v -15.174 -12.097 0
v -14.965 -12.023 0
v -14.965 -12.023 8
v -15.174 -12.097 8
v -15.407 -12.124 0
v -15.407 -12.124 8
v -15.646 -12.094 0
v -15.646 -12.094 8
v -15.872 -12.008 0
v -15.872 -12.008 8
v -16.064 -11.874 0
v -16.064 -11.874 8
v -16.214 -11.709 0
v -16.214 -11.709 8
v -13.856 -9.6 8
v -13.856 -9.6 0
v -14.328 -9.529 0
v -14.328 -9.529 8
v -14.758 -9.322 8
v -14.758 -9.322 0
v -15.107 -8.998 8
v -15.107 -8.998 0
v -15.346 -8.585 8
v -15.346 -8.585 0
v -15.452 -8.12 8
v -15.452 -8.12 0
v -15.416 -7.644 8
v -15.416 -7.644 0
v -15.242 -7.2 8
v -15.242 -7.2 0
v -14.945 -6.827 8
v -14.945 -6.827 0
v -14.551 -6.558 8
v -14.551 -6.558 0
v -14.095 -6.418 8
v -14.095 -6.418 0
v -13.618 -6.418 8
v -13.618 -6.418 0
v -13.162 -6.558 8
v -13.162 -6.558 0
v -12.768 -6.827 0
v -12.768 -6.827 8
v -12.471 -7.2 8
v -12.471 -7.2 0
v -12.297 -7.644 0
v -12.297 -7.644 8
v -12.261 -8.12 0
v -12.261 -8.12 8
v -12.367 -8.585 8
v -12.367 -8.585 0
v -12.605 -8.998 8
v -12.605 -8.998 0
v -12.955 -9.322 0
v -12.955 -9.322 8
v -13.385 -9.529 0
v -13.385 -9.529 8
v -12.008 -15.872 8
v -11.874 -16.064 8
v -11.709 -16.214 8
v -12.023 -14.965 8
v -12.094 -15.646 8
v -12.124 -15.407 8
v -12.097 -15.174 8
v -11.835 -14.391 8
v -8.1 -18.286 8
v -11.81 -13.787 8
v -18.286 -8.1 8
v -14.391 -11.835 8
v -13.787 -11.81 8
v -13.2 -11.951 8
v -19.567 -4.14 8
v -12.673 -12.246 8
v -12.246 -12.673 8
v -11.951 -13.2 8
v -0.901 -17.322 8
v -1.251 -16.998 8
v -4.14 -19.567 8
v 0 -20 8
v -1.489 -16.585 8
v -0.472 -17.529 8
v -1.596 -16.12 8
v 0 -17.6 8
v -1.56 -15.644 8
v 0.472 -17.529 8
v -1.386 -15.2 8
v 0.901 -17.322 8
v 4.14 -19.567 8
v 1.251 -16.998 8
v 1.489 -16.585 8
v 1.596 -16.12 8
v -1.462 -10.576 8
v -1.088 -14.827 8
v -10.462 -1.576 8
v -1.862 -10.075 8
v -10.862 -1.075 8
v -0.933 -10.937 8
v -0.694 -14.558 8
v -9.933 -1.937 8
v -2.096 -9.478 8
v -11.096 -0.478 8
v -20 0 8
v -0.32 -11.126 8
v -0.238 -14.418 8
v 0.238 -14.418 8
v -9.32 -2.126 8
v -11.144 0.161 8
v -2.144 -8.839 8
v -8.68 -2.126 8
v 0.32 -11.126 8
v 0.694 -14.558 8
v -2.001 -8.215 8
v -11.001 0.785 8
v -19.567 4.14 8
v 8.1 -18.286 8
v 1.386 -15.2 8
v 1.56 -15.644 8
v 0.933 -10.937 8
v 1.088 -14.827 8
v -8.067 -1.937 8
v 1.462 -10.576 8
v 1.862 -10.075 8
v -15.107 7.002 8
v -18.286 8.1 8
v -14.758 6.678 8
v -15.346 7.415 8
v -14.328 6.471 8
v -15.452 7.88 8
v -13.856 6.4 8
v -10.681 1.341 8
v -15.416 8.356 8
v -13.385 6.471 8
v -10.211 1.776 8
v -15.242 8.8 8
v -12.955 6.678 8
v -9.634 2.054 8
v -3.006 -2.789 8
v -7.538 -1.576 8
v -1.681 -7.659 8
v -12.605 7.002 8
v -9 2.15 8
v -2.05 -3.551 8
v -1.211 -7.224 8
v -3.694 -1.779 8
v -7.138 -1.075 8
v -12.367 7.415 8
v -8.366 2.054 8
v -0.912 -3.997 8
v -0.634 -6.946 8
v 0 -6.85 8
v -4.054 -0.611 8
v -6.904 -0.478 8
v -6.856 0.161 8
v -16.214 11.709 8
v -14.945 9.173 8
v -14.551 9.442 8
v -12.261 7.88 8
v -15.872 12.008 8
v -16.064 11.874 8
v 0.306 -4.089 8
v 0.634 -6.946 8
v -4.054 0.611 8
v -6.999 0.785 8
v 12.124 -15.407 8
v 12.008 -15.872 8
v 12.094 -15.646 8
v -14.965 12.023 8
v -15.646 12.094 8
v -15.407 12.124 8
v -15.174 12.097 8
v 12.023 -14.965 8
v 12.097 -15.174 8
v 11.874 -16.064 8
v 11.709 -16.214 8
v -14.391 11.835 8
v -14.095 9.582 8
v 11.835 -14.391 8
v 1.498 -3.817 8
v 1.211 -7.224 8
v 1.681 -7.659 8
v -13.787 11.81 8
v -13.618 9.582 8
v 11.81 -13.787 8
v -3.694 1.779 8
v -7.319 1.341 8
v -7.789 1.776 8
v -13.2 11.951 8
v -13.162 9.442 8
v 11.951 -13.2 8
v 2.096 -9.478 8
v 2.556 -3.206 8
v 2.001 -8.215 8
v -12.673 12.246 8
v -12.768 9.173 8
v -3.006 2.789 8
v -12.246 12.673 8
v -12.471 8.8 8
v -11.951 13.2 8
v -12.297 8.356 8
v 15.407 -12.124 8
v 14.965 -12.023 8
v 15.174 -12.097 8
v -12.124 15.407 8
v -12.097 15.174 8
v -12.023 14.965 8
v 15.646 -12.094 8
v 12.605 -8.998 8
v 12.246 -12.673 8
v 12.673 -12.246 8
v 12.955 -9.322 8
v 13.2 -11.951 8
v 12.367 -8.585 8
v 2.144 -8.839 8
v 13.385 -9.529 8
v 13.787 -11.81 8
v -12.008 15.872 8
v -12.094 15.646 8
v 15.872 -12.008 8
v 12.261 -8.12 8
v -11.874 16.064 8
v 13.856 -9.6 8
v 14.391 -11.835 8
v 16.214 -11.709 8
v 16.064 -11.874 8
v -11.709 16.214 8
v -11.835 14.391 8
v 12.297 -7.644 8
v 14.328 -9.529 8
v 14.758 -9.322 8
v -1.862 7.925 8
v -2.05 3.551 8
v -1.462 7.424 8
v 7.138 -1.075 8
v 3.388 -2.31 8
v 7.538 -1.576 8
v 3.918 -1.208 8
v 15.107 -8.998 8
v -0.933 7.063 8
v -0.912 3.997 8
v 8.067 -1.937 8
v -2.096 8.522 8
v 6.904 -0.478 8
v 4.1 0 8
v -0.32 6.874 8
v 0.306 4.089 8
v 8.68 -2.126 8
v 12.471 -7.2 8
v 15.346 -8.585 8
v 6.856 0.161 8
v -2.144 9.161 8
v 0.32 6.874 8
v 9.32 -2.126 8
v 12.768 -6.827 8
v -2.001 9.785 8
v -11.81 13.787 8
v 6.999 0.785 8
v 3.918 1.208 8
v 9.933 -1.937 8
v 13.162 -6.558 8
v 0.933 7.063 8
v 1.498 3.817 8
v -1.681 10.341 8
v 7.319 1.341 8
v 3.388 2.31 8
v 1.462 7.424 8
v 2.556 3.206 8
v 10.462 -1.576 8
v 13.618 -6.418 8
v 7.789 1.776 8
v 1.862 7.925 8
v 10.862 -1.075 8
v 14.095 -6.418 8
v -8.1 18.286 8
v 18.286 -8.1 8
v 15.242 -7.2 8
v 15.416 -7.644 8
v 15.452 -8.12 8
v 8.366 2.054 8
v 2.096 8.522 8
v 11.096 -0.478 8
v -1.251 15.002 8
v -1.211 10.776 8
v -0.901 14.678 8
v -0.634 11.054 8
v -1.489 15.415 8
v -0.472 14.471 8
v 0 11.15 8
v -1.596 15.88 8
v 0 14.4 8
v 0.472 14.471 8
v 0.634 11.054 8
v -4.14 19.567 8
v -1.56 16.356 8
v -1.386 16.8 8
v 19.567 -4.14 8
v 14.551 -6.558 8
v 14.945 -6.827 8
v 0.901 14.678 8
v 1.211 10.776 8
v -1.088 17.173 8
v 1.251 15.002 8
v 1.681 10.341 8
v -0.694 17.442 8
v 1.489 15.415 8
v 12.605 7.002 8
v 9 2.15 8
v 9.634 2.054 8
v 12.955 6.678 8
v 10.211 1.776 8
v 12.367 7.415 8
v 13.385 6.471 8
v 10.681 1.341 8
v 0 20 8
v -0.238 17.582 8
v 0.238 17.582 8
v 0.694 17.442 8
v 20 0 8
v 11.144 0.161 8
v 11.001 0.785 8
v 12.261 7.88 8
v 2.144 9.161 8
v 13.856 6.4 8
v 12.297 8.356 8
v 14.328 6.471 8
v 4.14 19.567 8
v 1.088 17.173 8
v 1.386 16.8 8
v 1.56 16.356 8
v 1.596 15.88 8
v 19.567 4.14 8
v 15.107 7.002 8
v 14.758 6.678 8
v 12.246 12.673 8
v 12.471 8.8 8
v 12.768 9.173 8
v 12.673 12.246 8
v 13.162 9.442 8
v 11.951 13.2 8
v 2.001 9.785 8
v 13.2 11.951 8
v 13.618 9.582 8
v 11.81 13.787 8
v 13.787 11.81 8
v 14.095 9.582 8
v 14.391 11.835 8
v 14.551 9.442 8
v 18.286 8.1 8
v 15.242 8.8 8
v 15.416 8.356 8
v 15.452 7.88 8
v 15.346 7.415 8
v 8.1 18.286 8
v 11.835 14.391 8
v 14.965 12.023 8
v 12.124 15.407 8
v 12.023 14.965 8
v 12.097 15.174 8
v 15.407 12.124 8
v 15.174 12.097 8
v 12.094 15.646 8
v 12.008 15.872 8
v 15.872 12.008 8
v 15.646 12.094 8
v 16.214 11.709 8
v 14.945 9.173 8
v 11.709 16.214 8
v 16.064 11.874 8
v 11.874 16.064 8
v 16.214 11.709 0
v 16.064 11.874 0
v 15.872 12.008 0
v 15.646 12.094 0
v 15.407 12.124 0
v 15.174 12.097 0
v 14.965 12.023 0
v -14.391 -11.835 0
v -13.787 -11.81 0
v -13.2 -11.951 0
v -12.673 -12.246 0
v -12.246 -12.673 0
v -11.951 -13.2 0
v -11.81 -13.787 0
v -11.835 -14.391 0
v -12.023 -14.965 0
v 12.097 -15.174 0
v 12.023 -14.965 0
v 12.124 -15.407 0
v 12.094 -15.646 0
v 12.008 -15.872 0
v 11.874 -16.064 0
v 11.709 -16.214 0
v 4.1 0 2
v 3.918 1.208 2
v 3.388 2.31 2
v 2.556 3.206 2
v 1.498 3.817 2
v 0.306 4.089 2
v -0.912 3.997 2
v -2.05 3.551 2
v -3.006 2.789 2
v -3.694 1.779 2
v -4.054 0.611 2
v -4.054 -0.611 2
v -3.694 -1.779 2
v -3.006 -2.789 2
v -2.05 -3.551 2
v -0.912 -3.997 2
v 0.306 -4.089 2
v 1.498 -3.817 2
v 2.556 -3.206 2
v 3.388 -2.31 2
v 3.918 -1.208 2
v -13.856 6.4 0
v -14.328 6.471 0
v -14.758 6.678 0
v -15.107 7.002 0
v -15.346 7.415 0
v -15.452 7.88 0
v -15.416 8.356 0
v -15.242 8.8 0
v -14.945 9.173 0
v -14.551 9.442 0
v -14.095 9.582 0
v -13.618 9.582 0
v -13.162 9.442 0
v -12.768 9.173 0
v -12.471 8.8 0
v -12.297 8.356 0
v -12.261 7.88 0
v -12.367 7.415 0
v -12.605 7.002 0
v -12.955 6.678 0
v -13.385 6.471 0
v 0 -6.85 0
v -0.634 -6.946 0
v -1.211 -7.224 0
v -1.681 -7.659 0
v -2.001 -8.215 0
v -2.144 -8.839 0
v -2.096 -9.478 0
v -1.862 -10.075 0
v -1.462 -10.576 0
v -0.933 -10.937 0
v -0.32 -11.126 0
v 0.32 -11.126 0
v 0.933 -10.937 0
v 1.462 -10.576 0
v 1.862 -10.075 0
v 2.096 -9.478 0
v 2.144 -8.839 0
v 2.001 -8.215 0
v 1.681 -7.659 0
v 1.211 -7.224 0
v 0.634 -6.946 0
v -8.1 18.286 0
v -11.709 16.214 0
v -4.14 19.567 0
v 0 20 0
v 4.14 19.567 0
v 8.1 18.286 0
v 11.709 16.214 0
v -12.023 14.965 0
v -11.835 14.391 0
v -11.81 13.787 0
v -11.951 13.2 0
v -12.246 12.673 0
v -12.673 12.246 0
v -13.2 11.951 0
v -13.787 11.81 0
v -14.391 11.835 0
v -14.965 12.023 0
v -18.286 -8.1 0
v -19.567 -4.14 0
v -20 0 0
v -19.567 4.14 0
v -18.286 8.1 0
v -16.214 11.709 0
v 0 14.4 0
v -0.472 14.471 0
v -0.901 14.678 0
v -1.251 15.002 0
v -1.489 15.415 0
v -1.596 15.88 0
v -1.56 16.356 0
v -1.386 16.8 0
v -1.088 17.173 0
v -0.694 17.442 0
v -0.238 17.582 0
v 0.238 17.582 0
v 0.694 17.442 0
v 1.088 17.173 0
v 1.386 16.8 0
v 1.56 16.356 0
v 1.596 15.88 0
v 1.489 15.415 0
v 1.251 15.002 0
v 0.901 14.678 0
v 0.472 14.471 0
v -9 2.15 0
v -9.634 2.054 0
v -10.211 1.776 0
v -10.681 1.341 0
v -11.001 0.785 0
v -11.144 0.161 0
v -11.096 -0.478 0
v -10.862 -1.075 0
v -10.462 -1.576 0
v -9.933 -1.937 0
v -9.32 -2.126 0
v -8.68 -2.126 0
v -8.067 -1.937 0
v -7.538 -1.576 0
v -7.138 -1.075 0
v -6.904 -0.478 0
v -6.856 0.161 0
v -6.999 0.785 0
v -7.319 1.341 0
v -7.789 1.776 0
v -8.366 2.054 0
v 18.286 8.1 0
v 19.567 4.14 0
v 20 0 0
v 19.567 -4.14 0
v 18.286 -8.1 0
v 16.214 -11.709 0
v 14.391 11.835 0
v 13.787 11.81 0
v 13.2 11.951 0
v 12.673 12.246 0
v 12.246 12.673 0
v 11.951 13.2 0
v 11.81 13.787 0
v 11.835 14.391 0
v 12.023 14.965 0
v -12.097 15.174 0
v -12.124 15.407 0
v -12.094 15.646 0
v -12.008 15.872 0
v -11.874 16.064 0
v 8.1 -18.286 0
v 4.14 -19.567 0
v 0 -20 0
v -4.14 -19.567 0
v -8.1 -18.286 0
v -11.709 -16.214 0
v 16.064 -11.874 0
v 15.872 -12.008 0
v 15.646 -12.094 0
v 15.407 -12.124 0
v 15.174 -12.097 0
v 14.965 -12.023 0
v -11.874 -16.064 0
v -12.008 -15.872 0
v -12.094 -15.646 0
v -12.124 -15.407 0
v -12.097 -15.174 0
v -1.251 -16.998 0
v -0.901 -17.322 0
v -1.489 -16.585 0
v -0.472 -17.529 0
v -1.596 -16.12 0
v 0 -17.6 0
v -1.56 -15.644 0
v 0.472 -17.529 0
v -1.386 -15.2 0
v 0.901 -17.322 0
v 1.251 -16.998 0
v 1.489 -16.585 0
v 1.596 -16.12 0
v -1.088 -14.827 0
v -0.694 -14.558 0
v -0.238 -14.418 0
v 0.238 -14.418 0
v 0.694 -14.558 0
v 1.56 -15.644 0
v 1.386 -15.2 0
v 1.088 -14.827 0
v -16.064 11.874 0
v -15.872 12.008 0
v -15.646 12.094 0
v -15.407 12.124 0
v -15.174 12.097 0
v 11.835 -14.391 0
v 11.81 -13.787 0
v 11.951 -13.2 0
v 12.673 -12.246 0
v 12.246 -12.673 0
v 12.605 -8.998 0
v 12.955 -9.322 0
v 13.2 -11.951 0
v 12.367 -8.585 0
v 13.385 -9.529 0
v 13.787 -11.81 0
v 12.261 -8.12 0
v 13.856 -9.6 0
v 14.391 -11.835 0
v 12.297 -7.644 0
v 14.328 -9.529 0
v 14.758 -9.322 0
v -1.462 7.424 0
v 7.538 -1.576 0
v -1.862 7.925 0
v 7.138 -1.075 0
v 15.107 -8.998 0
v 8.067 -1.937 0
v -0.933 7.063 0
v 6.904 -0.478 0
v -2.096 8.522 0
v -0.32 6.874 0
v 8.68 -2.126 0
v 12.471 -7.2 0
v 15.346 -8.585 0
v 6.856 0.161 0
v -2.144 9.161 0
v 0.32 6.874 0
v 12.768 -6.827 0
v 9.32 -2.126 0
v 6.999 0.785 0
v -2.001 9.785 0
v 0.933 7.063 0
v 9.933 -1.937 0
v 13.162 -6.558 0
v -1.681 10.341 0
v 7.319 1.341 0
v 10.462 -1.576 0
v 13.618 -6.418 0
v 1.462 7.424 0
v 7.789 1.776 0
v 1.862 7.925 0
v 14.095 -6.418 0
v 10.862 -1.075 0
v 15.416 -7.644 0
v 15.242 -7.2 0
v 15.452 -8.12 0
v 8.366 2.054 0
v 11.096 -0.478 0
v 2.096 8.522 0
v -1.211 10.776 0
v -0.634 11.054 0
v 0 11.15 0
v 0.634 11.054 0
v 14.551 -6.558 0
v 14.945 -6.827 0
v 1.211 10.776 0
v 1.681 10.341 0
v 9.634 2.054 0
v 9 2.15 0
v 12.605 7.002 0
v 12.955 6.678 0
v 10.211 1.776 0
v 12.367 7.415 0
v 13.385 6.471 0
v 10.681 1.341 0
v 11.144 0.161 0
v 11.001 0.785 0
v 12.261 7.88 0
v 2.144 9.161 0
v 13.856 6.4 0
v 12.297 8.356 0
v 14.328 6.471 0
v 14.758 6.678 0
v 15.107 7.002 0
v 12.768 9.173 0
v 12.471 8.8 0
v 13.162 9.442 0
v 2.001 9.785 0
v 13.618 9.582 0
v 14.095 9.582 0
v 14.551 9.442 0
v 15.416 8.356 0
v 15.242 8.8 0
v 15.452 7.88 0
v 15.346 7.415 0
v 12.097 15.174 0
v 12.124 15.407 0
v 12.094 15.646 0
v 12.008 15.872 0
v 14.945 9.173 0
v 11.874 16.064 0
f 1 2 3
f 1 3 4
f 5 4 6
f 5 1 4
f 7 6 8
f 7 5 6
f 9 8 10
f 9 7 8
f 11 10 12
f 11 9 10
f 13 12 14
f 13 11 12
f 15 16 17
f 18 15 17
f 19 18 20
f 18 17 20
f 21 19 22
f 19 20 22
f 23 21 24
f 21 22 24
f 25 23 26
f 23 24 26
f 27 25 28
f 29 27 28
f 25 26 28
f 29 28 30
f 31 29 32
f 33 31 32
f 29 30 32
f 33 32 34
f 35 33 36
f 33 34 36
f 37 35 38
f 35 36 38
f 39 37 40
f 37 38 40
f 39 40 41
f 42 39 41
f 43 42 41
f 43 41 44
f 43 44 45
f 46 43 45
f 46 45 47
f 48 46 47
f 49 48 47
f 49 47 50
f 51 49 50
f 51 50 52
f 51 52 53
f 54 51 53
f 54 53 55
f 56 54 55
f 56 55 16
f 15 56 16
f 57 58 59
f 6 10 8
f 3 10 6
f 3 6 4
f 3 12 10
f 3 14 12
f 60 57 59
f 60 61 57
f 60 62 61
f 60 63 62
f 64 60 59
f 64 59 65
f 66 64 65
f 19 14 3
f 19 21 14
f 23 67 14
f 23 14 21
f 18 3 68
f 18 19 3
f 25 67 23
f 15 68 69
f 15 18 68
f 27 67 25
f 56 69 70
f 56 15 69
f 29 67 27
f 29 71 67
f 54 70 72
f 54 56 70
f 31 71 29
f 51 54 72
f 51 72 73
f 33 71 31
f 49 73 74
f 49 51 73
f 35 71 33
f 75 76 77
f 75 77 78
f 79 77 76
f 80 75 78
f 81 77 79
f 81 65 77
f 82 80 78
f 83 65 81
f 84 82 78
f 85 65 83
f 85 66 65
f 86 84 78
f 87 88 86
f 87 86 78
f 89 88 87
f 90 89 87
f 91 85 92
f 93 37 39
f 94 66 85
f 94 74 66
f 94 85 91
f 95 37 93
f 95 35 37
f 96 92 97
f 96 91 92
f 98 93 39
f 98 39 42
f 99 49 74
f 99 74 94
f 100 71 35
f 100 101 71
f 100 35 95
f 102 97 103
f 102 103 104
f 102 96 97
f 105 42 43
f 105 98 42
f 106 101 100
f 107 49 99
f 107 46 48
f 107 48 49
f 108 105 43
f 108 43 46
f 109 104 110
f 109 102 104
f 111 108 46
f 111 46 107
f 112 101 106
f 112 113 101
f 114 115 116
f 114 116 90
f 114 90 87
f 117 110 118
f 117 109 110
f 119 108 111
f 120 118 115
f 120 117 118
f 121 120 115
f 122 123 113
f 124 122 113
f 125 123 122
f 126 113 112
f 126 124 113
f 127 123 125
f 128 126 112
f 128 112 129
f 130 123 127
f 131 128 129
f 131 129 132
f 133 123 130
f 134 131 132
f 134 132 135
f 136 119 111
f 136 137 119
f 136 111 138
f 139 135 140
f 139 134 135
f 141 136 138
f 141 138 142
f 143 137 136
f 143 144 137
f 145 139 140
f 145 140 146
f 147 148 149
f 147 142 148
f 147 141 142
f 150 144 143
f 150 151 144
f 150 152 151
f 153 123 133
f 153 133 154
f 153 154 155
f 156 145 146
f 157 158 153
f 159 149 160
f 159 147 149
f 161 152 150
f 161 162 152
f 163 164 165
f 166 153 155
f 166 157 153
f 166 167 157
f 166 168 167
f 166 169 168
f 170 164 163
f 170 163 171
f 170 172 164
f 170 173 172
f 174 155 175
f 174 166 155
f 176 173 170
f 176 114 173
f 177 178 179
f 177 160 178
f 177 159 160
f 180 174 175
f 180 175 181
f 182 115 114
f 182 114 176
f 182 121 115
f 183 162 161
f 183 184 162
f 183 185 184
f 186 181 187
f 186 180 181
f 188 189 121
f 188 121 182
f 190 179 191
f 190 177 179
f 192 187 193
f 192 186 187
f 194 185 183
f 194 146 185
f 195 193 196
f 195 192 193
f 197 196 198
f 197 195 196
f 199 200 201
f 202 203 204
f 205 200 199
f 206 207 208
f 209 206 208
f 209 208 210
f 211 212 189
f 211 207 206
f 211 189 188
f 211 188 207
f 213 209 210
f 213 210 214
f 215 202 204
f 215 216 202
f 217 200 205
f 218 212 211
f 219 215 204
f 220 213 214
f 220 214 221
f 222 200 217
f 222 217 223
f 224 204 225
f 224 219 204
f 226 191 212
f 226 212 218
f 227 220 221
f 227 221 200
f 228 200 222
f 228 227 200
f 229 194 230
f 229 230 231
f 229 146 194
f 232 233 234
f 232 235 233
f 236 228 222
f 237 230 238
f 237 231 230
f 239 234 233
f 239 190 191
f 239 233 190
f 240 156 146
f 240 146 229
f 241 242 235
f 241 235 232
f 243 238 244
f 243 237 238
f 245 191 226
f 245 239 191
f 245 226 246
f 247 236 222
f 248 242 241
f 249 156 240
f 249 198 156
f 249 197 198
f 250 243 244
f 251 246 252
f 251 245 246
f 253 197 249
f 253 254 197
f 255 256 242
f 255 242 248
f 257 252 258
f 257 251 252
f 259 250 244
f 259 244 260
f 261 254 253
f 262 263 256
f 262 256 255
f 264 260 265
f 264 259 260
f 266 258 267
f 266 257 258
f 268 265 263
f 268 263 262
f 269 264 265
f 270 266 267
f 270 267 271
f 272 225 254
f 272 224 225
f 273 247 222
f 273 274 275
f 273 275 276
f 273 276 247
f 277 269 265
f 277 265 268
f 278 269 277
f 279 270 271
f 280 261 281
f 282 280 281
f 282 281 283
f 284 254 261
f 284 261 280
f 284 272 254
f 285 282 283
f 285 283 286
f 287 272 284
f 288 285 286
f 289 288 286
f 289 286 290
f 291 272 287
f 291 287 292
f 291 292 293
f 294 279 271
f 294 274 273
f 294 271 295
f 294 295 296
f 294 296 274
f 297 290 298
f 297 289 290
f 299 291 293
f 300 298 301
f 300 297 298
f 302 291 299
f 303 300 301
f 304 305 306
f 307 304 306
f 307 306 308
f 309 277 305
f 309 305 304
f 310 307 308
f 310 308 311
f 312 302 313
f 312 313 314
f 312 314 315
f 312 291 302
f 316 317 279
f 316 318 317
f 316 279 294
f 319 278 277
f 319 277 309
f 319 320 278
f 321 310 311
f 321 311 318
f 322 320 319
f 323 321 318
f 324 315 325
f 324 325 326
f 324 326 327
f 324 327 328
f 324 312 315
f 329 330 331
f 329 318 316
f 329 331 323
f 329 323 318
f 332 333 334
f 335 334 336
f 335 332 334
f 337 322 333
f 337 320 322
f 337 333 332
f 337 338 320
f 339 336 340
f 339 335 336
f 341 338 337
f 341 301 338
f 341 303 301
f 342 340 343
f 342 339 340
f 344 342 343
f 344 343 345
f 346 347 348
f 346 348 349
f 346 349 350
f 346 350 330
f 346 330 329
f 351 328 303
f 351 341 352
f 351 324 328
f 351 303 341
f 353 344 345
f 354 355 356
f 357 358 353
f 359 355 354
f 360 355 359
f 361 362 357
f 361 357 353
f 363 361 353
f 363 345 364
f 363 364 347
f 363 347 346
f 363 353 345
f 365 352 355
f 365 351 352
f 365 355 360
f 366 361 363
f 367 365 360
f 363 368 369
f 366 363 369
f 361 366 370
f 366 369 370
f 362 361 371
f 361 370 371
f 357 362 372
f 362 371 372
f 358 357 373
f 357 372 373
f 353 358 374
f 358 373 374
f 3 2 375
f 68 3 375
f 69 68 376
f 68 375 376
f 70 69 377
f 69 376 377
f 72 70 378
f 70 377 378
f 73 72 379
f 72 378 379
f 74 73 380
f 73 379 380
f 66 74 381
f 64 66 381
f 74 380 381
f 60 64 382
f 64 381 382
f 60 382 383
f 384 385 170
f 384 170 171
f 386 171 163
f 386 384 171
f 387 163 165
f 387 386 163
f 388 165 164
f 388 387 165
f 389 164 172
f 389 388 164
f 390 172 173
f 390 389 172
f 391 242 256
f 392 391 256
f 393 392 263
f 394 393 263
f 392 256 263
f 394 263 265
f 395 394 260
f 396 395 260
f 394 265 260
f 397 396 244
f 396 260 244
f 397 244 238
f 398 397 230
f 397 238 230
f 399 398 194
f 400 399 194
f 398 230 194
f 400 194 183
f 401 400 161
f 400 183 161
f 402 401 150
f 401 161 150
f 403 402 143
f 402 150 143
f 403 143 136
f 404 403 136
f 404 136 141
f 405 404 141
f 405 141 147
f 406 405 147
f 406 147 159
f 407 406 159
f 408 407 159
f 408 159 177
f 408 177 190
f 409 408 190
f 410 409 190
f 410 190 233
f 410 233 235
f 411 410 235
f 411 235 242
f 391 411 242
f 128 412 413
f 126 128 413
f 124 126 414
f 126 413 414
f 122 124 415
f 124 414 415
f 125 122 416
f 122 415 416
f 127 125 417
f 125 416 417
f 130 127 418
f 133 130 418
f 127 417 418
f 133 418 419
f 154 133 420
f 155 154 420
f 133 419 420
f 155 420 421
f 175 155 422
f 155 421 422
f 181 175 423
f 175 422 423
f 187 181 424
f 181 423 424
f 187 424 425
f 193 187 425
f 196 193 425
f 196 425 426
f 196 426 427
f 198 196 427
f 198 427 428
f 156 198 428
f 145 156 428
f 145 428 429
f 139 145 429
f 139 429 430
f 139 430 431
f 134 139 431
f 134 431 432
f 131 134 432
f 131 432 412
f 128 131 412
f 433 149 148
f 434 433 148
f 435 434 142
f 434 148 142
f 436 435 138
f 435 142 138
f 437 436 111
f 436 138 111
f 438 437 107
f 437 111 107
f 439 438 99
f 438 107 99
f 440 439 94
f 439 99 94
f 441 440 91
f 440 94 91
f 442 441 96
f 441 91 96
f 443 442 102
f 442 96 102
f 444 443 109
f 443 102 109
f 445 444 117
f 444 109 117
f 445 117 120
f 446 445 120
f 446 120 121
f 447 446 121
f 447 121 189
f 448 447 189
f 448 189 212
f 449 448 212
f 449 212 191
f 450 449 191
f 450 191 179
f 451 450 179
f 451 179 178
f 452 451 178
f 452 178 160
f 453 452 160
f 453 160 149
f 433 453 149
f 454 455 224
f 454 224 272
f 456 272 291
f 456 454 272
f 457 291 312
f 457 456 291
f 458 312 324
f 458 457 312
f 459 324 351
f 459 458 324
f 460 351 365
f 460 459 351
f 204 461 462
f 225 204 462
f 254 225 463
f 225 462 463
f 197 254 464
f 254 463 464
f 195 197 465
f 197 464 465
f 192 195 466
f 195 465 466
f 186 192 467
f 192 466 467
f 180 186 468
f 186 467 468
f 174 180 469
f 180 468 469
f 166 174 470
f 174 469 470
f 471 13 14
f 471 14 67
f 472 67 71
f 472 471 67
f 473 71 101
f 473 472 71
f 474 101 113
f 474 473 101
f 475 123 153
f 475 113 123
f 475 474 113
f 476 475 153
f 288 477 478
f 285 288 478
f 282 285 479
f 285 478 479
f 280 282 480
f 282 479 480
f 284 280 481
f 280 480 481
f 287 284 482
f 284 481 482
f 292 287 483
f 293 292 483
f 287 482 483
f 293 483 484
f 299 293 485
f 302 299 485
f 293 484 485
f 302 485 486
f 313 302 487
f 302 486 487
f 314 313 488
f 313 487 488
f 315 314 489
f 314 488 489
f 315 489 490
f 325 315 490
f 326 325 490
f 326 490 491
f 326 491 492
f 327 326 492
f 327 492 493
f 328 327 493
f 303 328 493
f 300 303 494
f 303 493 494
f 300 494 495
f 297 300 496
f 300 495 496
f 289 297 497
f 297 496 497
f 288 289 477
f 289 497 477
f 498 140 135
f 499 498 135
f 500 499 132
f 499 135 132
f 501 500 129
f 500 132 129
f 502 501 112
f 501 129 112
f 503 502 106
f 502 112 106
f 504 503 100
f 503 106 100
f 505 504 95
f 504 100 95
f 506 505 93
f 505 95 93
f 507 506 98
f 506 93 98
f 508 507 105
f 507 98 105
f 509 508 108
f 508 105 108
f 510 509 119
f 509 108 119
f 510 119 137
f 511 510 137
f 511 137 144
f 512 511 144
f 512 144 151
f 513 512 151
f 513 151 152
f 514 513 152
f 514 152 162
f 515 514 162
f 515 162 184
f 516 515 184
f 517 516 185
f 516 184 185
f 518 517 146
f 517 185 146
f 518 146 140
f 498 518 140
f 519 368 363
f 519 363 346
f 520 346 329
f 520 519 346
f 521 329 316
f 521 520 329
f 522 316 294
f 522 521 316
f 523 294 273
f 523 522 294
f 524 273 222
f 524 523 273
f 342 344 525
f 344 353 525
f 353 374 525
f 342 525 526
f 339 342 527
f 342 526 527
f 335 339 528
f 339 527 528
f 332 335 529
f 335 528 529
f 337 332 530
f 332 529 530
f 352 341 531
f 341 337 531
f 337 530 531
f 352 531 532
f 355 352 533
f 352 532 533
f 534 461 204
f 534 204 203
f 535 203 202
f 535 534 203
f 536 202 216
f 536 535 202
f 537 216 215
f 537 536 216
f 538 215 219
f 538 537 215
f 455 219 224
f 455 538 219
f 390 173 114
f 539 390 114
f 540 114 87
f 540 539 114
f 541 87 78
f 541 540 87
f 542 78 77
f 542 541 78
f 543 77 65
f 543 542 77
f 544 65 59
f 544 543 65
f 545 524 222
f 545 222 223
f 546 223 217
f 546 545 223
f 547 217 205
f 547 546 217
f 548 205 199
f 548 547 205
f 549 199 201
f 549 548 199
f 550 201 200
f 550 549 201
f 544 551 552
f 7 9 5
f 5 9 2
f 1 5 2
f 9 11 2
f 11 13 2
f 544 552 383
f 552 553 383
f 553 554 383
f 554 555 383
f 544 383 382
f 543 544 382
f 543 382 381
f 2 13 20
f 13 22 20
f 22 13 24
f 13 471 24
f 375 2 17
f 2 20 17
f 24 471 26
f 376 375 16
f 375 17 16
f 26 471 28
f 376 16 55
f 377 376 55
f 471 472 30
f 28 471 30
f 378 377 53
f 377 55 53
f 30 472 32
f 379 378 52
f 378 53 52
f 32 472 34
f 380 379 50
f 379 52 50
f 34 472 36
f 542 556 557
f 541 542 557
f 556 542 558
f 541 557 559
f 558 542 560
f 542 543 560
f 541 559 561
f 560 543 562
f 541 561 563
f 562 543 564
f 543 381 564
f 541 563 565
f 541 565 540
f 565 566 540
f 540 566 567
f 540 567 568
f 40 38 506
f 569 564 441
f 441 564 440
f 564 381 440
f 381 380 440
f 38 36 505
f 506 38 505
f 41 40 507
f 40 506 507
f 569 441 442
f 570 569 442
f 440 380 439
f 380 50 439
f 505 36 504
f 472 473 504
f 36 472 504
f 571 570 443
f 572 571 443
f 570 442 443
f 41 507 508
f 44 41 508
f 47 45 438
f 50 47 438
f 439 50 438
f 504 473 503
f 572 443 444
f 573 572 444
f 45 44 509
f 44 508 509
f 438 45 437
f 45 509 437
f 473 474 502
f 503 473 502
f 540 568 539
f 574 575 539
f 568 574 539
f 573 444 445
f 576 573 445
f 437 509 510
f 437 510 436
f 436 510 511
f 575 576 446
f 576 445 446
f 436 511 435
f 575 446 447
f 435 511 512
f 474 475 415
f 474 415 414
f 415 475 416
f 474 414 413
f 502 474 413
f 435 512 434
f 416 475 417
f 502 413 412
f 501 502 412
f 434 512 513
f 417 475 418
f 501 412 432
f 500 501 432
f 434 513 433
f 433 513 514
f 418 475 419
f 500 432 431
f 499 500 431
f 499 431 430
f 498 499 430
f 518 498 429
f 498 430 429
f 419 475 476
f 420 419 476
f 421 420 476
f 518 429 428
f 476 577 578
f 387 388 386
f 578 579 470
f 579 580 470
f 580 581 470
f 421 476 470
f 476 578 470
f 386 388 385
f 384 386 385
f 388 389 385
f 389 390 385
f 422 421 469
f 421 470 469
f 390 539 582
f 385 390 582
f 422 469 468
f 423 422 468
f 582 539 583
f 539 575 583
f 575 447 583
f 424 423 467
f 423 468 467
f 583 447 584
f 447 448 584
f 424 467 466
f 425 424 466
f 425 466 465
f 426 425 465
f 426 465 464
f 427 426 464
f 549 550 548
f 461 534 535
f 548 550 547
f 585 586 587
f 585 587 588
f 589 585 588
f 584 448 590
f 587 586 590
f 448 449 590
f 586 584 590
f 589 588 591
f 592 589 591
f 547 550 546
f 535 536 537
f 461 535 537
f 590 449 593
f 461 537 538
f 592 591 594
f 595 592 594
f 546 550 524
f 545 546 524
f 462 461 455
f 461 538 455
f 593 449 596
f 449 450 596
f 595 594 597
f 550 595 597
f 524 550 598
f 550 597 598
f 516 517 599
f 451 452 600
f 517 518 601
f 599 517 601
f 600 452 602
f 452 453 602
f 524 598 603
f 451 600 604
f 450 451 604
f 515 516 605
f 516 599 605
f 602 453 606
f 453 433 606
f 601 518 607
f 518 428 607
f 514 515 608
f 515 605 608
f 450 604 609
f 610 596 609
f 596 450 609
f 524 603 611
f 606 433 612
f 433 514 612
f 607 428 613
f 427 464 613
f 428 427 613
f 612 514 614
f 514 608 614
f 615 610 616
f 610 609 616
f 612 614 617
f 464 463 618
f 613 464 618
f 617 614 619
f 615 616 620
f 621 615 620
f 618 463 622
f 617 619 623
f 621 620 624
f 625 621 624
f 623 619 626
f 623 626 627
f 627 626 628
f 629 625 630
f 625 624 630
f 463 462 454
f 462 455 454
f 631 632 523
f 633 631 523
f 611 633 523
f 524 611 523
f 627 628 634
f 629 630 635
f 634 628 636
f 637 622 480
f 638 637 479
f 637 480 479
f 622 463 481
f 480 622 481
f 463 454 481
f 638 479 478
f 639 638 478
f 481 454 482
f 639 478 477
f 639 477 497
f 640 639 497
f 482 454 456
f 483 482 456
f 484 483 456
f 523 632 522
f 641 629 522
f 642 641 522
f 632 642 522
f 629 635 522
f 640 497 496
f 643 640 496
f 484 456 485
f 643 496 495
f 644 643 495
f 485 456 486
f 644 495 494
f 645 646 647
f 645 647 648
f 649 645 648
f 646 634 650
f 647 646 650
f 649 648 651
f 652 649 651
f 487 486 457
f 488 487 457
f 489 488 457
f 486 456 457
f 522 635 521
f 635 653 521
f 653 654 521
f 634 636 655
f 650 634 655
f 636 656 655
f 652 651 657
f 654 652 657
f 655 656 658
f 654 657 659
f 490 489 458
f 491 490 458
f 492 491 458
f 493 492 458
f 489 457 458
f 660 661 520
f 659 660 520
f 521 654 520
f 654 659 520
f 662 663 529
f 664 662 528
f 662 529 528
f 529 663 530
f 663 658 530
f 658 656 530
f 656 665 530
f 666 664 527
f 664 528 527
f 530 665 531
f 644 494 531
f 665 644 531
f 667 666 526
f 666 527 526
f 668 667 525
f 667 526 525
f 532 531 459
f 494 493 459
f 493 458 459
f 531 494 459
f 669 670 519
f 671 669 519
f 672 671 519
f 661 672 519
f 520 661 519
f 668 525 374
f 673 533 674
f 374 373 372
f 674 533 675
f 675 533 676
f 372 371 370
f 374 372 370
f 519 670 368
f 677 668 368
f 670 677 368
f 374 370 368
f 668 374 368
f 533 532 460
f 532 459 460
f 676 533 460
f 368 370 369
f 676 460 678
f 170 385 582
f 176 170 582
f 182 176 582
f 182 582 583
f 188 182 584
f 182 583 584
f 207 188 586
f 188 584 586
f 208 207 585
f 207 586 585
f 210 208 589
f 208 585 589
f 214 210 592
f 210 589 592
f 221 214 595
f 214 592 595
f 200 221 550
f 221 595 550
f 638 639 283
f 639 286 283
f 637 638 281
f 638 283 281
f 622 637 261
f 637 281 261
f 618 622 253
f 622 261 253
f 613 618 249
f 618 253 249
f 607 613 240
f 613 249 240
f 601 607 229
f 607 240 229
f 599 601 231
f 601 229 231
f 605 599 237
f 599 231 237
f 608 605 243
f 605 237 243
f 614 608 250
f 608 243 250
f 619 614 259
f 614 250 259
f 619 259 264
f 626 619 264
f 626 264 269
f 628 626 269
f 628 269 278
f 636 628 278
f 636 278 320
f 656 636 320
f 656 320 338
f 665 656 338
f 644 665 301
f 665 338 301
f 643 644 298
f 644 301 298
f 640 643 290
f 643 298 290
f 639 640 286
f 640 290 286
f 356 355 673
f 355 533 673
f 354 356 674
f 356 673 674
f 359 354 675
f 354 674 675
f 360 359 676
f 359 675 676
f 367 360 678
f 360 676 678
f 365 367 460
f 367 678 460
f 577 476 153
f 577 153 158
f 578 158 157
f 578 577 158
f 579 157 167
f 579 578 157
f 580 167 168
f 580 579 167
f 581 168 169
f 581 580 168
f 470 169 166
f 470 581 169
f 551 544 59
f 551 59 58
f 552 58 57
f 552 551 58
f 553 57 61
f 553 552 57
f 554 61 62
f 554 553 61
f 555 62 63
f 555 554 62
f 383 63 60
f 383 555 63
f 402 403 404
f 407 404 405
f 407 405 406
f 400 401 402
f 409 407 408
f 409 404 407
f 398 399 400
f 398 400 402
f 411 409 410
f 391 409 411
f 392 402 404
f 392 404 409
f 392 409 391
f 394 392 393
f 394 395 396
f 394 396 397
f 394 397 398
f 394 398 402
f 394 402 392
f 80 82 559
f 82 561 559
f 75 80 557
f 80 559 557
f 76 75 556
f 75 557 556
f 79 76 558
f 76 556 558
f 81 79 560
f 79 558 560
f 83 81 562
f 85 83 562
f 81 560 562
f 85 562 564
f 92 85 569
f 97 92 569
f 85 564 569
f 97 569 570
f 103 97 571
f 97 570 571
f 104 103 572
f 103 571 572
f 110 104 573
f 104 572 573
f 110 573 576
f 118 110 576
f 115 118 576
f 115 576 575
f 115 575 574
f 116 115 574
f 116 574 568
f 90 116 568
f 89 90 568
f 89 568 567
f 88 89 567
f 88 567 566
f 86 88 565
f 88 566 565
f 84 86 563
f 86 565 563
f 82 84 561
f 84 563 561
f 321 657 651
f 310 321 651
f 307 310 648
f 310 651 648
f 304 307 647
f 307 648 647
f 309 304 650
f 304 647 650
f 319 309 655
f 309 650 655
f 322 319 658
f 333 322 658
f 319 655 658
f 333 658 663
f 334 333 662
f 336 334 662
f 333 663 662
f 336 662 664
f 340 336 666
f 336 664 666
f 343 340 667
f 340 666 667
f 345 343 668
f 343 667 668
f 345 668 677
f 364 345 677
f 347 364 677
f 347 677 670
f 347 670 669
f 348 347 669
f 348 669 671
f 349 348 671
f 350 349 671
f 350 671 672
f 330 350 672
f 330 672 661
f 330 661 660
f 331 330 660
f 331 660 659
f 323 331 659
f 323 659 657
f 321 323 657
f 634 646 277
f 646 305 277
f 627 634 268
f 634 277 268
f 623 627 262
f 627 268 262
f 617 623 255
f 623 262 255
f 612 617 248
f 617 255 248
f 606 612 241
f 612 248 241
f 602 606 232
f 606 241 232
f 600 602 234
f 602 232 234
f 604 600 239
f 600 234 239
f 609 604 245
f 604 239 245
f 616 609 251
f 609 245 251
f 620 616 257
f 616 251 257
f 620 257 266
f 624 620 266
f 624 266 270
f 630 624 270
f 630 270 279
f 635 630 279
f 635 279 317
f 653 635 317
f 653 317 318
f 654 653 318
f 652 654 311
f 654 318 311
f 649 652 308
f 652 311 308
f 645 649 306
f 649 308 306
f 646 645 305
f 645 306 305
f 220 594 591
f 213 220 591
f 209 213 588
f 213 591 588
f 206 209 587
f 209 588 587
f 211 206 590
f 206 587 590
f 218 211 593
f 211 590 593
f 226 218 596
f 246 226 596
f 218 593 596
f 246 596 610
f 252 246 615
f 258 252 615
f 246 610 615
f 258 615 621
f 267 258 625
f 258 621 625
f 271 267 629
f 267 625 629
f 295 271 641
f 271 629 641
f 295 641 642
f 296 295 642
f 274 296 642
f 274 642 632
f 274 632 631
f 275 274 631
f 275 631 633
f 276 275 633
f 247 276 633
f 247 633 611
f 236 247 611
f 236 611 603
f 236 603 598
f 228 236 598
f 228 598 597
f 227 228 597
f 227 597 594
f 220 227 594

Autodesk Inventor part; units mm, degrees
ref_plane "YZ Plane" through (0, 0, 0) normal (1, 0, 0) x (0, 1, 0)
ref_plane "XZ Plane" through (0, 0, 0) normal (0, 1, 0) x (-1, 0, 0)
ref_plane "XY Plane" through (0, 0, 0) normal (0, 0, 1) x (1, 0, 0)
sketch "スケッチ1" plane through (0, 0, 0) normal (0, 0, 1) x (1, 0, 0)
  circle A0 centre (0, 0) radius 20
  dimension "d0" = 40
extrude "押し出し1" add sketch "スケッチ1" along normal blind 8
sketch "スケッチ2" plane through (0, 0, 8) normal (0, 0, 1) x (1, 0, 0)
  circle A0 centre (0, 0) radius 16
  point P0 (0, 16)
  point P1 (-13.8564, 8)
  point P2 (-13.8564, -8)
  point P3 (0, -16)
  point P4 (13.8564, -8)
  point P5 (13.8564, 8)
  dimension "d3" = 32
  dimension "d6" = 360
hole "穴1" at (0, 16, 8) at (-13.8564, 8, 8) at (-13.8564, -8, 8) at (0, -16, 8) at (13.8564, -8, 8) at (13.8564, 8, 8) direction (0, 0, -1) diameter 3.2 end through all clearance for "Socket Head Cap Screw" size "M3" standard "Ansi Metric M Profile"
sketch "スケッチ3" plane through (0, 0, 0) normal (0, 0, -1) x (-1, 0, 0)
  circle A0 centre (0, 0) radius 9
  point P0 (0, 9)
  point P1 (-9, 0)
  point P2 (0, -9)
  point P3 (9, 0)
  dimension "d15" = 18
  dimension "d18" = 360
hole "穴2" at (0, 9, 0) at (9, 0, 0) at (0, -9, 0) at (-9, 0, 0) direction (0, 0, 1) diameter 4.3 end through all clearance for "Socket Head Cap Screw" size "M4" standard "Ansi Metric M Profile"
sketch "スケッチ4" plane through (0, 0, 8) normal (0, 0, 1) x (1, 0, 0)
  circle A0 centre (0, 0) radius 4.1
  dimension "d27" = 8.2
extrude "押し出し2" cut sketch "スケッチ4" against normal blind 6
sketch "スケッチ5" plane through (0, 0, 8) normal (0, 0, 1) x (1, 0, 0)
  line L0 (-14, -14) -> (14, -14)
  line L1 (14, -14) -> (14, 14)
  line L2 (14, 14) -> (-14, 14)
  line L3 (-14, 14) -> (-14, -14)
  line L4 (-14, -14) -> (14, 14) construction
  line L5 (14, -14) -> (-14, 14) construction
  point P0 (0, 0)
  dimension "d30" = 28
  dimension "d31" = 28
hole "穴3" at (-14, 14, 8) at (14, 14, 8) at (14, -14, 8) at (-14, -14, 8) direction (0, 0, -1) diameter 2.2 end through all counterbore diameter 4.4 counterbore depth 20 clearance for "Socket Head Cap Screw" size "M2" standard "Ansi Metric M Profile"
fillet "フィレット1" radius 1 8 edges at (15.611, -12.5018, 4) (15.611, 12.5018, 4) (12.5018, 15.611, 4) (12.5018, -15.611, 4) (-12.5018, -15.611, 4) (-15.611, -12.5018, 4) (-15.611, 12.5018, 4) (-12.5018, 15.611, 4)
properties part number "scara-base18" material "ABS プラスチック"
